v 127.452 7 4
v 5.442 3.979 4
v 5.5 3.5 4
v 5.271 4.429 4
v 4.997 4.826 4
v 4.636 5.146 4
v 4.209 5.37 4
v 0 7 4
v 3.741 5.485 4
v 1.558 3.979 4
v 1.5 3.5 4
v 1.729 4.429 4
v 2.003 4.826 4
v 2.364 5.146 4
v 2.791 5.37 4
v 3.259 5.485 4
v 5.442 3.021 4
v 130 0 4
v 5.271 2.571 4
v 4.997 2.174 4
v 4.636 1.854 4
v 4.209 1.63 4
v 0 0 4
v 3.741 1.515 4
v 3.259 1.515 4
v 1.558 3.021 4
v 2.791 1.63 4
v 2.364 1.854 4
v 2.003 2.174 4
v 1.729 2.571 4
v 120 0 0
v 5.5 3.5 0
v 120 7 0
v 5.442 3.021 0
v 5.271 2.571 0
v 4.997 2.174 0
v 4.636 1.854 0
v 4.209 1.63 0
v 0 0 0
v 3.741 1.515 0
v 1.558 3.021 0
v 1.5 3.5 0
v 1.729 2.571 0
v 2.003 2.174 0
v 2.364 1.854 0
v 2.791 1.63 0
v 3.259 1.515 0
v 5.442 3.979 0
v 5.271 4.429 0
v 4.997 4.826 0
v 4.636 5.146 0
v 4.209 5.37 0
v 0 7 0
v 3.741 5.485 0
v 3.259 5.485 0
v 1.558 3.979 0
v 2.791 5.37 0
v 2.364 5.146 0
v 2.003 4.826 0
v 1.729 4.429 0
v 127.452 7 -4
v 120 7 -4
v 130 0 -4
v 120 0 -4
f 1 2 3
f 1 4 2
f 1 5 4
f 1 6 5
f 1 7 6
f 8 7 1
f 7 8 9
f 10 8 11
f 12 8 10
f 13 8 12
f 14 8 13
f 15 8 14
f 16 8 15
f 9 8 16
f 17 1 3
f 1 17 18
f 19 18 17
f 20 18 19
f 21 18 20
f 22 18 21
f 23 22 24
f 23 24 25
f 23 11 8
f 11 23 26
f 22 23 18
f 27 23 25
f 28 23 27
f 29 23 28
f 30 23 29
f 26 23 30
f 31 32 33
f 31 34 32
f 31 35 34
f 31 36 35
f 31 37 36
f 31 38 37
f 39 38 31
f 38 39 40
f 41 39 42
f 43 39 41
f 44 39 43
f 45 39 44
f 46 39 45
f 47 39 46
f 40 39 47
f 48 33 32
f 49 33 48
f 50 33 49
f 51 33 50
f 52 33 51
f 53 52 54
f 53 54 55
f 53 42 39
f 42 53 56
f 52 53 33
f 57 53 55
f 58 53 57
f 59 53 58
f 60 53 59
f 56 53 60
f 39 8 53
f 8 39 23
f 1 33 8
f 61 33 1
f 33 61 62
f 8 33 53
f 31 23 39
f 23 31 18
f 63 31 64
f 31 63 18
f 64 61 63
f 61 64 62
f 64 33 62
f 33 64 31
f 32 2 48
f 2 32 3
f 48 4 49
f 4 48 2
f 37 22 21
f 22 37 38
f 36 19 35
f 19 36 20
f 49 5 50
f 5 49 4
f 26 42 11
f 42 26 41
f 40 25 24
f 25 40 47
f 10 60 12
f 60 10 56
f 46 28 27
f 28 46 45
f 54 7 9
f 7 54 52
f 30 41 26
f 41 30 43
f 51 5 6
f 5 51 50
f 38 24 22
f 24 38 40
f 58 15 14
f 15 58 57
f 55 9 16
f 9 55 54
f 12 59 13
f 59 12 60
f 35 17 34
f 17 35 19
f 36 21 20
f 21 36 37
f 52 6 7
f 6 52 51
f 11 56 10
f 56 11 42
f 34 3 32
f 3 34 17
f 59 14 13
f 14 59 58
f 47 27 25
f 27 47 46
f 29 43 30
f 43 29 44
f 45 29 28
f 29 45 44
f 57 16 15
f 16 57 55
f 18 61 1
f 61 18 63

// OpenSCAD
$fa=0.5; // default minimum facet angle is now 0.5
$fs=0.5; // default minimum facet size is now 0.5 mm

support_height = 4;
support_width = 7;
support_length = 130;

hole_diameter = 4;
hole_offset = 6;

difference() {
    union() {
        cube([support_length, support_width, support_height]);
        translate([support_length - 10, 0, -support_height]) cube([10, support_width, support_height]);
    }
    translate([support_width/2,support_width/2,-1]) cylinder(d = hole_diameter, h = 2 + support_height);
    #translate([support_length,0,-1-support_height]) rotate([0,0,20]) cube([support_width*2, support_width*2, 2 + support_height*2]); 
}
